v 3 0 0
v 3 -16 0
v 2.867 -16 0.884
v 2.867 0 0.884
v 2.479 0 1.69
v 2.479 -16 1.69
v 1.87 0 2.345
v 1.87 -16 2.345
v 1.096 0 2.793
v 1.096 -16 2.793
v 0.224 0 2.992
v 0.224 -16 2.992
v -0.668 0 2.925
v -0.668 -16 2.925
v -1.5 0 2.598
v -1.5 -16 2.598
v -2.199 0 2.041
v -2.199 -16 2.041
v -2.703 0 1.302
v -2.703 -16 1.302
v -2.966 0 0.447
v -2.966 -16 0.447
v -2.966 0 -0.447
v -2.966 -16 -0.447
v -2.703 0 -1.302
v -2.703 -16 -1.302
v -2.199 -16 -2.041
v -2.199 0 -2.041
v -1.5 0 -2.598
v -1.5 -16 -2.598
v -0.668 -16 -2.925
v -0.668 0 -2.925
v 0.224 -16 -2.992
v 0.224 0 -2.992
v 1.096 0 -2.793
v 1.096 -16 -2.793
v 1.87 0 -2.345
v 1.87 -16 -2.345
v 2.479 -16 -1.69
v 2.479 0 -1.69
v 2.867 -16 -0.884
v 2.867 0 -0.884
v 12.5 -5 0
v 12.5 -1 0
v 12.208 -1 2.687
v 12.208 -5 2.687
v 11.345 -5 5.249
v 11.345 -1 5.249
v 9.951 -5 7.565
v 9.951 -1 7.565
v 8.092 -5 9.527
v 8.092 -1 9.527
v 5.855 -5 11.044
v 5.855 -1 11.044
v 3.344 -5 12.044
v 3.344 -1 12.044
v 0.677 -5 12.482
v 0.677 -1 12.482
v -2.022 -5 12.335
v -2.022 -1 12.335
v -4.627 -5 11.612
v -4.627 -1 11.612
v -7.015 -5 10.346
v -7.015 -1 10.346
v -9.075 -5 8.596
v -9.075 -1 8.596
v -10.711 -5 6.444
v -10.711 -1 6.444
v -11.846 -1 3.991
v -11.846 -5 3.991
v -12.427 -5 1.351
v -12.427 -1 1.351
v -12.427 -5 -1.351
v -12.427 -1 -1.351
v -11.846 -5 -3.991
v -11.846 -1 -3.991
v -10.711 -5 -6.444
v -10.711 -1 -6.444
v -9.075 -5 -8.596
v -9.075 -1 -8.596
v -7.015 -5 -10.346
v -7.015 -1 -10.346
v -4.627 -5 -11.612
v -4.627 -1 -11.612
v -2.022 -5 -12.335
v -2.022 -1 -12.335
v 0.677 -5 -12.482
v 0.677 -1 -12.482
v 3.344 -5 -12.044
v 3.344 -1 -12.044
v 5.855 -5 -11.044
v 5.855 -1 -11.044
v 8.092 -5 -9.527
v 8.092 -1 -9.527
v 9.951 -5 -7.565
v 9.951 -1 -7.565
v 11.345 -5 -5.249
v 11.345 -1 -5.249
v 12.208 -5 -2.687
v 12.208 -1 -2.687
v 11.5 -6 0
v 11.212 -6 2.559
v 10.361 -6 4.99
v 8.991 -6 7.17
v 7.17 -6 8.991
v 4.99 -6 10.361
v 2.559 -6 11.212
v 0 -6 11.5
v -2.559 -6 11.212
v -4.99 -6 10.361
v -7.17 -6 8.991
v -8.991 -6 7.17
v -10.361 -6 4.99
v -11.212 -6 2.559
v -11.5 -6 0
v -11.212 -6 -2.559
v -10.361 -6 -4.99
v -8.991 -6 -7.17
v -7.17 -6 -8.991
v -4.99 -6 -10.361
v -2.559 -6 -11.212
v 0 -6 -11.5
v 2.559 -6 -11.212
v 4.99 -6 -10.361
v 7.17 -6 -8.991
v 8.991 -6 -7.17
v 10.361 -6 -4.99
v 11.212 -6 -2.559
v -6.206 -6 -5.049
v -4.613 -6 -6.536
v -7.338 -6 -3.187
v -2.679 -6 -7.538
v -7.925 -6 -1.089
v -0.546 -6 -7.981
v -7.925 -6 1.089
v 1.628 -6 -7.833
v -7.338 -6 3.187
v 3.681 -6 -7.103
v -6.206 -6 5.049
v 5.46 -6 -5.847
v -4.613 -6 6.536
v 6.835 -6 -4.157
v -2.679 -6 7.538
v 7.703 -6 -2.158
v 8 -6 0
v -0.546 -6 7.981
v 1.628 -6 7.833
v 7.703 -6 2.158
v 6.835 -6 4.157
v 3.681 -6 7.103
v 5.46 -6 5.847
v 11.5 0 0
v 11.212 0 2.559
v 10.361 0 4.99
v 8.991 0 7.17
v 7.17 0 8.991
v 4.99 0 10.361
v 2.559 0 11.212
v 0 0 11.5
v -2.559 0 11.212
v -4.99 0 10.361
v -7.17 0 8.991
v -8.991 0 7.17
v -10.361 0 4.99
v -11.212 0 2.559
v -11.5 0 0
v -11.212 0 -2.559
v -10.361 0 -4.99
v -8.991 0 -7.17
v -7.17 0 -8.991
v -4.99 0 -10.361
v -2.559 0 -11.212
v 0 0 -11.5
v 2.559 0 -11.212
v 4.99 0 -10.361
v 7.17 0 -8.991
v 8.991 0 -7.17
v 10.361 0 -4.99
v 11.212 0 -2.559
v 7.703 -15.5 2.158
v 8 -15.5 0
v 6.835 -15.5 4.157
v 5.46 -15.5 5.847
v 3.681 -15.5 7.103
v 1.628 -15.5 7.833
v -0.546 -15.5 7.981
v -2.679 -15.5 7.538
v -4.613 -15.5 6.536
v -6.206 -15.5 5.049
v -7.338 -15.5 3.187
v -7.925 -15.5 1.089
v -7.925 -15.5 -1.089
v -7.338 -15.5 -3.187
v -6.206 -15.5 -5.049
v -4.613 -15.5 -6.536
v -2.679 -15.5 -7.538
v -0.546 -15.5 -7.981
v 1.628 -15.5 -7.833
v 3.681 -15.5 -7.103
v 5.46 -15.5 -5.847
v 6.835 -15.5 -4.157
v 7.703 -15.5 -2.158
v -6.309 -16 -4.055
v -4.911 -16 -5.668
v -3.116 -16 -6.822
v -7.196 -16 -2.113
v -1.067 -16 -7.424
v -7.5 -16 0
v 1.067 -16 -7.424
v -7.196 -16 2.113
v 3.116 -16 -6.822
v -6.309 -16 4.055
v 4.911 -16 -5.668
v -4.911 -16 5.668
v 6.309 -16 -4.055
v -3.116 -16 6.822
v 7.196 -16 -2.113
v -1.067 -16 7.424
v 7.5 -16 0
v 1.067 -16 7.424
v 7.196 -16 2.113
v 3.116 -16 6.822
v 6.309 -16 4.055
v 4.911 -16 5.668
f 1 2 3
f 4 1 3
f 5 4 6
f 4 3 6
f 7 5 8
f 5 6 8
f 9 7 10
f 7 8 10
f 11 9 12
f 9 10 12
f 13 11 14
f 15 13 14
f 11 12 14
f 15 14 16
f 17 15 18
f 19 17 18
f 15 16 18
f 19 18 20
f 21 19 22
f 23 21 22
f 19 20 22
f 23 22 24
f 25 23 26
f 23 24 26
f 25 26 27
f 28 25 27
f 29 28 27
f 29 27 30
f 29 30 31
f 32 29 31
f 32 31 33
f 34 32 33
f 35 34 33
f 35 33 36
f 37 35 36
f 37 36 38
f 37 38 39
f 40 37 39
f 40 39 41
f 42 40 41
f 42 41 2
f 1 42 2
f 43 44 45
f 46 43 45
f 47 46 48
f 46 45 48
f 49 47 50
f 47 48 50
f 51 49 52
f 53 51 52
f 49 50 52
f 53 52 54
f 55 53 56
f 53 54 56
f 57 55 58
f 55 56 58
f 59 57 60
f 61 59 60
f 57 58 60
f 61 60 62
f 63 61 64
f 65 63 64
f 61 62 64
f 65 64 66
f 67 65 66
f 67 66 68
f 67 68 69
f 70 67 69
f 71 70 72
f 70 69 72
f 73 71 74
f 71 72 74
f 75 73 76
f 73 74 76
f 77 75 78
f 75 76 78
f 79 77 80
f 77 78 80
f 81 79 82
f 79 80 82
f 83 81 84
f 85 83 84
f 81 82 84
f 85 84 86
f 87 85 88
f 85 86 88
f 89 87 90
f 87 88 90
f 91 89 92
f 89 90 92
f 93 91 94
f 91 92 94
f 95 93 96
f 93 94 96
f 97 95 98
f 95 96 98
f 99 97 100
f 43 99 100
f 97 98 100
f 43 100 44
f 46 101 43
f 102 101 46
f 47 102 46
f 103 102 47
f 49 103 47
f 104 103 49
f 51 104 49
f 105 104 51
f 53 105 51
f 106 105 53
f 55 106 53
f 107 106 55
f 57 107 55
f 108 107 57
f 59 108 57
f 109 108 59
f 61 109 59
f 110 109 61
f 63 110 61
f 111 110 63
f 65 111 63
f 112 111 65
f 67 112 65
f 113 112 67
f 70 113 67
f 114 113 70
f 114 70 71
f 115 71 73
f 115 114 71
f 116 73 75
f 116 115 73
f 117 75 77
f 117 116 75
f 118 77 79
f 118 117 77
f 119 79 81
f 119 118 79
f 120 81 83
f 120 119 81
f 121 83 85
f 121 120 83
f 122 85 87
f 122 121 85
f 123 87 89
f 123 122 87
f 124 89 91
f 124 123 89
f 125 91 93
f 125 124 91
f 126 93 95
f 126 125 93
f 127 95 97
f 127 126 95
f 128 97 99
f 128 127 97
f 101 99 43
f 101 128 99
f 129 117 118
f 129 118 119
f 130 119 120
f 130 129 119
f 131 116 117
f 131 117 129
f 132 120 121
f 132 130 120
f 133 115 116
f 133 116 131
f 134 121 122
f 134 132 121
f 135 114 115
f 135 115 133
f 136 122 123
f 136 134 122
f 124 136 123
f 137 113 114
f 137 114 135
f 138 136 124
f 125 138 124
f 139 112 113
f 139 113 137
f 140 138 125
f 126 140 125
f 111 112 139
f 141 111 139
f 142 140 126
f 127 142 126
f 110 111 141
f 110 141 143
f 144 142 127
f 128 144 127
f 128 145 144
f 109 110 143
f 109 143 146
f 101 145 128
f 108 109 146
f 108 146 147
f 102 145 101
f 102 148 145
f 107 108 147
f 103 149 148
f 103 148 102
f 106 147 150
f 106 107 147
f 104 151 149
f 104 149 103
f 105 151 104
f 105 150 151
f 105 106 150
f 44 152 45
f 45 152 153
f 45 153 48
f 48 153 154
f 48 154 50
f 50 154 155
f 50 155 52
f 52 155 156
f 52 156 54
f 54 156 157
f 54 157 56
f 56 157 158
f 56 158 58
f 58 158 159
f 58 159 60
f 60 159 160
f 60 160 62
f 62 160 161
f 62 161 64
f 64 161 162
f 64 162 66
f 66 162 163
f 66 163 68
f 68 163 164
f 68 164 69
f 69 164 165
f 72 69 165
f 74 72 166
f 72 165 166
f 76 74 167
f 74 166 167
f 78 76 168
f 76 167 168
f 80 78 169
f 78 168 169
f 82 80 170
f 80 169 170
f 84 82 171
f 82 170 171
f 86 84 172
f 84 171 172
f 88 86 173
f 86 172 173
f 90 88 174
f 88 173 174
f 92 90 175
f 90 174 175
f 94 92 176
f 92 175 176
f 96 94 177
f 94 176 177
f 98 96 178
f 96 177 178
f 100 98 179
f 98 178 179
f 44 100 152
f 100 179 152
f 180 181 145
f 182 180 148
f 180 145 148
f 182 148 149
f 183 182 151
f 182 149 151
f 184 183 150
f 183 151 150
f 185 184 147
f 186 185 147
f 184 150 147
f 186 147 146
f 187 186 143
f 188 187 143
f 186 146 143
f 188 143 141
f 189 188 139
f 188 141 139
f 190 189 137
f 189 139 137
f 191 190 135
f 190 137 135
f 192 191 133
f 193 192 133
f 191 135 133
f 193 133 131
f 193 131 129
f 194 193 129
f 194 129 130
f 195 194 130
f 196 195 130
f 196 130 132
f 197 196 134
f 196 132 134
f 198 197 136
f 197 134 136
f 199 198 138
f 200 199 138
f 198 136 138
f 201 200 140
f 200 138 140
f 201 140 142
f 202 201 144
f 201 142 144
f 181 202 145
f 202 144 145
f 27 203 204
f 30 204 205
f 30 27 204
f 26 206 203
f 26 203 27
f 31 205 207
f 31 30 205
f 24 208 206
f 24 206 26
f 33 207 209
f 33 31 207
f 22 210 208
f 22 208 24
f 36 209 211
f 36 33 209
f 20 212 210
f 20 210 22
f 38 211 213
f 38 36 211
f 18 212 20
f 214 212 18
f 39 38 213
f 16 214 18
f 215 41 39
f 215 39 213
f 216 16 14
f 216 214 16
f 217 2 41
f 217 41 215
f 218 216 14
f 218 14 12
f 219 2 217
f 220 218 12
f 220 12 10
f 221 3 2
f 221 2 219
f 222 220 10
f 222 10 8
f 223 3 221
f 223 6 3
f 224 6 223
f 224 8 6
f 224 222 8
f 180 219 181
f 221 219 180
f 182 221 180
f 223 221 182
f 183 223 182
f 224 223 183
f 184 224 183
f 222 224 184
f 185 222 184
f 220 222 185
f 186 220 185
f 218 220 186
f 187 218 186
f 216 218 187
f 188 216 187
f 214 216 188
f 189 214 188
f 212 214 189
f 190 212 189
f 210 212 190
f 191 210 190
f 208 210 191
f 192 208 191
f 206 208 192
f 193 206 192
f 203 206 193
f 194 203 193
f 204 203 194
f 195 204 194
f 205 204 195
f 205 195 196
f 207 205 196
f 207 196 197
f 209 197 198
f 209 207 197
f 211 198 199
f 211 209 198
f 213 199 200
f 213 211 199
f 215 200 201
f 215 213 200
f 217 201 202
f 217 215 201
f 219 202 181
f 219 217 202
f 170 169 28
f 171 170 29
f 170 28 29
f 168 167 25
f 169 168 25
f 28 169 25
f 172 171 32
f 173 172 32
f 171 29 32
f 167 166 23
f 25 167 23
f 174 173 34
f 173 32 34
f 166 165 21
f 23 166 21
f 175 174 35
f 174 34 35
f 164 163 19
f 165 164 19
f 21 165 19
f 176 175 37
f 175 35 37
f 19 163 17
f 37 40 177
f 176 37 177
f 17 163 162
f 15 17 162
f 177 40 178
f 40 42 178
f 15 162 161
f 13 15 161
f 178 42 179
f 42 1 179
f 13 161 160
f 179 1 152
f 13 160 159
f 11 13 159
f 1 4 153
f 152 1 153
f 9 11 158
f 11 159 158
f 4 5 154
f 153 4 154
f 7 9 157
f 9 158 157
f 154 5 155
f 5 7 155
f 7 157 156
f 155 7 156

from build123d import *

# Parameters (mm, degrees)
F0_R     = 12.5
F1_DEPTH = 6
F2_R     = 8
F3_DEPTH = 10
F4_R     = 3
F5_DEPTH = 25
F6_SIZE  = 1
F7_SIZE  = 0.5


with BuildPart() as f1:
    # F0 (on Front) → F1 (new body)
    with BuildSketch(Plane.XZ):
        Circle(F0_R)
    extrude(amount=F1_DEPTH)

    # F2 (on face) → F3 (join)
    with BuildSketch(Plane.XZ.offset(6)):
        Circle(F2_R)
    extrude(amount=F3_DEPTH)

    # F4 (on face) → F5 (cut)
    with BuildSketch(Plane.XZ.offset(16)):
        Circle(F4_R)
    extrude(amount=-F5_DEPTH, mode=Mode.SUBTRACT)

    # F6
    f6_edges = [f1.edges().sort_by_distance(p)[0] for p in [
        (-12.5, -6, 0),
        (-12.5, 0, 0),
    ]]
    chamfer(f6_edges, length=F6_SIZE)

    # F7
    f7_edges = [f1.edges().sort_by_distance(p)[0] for p in [
        (-8, -16, 0),
    ]]
    chamfer(f7_edges, length=F7_SIZE)


solid = f1.part
